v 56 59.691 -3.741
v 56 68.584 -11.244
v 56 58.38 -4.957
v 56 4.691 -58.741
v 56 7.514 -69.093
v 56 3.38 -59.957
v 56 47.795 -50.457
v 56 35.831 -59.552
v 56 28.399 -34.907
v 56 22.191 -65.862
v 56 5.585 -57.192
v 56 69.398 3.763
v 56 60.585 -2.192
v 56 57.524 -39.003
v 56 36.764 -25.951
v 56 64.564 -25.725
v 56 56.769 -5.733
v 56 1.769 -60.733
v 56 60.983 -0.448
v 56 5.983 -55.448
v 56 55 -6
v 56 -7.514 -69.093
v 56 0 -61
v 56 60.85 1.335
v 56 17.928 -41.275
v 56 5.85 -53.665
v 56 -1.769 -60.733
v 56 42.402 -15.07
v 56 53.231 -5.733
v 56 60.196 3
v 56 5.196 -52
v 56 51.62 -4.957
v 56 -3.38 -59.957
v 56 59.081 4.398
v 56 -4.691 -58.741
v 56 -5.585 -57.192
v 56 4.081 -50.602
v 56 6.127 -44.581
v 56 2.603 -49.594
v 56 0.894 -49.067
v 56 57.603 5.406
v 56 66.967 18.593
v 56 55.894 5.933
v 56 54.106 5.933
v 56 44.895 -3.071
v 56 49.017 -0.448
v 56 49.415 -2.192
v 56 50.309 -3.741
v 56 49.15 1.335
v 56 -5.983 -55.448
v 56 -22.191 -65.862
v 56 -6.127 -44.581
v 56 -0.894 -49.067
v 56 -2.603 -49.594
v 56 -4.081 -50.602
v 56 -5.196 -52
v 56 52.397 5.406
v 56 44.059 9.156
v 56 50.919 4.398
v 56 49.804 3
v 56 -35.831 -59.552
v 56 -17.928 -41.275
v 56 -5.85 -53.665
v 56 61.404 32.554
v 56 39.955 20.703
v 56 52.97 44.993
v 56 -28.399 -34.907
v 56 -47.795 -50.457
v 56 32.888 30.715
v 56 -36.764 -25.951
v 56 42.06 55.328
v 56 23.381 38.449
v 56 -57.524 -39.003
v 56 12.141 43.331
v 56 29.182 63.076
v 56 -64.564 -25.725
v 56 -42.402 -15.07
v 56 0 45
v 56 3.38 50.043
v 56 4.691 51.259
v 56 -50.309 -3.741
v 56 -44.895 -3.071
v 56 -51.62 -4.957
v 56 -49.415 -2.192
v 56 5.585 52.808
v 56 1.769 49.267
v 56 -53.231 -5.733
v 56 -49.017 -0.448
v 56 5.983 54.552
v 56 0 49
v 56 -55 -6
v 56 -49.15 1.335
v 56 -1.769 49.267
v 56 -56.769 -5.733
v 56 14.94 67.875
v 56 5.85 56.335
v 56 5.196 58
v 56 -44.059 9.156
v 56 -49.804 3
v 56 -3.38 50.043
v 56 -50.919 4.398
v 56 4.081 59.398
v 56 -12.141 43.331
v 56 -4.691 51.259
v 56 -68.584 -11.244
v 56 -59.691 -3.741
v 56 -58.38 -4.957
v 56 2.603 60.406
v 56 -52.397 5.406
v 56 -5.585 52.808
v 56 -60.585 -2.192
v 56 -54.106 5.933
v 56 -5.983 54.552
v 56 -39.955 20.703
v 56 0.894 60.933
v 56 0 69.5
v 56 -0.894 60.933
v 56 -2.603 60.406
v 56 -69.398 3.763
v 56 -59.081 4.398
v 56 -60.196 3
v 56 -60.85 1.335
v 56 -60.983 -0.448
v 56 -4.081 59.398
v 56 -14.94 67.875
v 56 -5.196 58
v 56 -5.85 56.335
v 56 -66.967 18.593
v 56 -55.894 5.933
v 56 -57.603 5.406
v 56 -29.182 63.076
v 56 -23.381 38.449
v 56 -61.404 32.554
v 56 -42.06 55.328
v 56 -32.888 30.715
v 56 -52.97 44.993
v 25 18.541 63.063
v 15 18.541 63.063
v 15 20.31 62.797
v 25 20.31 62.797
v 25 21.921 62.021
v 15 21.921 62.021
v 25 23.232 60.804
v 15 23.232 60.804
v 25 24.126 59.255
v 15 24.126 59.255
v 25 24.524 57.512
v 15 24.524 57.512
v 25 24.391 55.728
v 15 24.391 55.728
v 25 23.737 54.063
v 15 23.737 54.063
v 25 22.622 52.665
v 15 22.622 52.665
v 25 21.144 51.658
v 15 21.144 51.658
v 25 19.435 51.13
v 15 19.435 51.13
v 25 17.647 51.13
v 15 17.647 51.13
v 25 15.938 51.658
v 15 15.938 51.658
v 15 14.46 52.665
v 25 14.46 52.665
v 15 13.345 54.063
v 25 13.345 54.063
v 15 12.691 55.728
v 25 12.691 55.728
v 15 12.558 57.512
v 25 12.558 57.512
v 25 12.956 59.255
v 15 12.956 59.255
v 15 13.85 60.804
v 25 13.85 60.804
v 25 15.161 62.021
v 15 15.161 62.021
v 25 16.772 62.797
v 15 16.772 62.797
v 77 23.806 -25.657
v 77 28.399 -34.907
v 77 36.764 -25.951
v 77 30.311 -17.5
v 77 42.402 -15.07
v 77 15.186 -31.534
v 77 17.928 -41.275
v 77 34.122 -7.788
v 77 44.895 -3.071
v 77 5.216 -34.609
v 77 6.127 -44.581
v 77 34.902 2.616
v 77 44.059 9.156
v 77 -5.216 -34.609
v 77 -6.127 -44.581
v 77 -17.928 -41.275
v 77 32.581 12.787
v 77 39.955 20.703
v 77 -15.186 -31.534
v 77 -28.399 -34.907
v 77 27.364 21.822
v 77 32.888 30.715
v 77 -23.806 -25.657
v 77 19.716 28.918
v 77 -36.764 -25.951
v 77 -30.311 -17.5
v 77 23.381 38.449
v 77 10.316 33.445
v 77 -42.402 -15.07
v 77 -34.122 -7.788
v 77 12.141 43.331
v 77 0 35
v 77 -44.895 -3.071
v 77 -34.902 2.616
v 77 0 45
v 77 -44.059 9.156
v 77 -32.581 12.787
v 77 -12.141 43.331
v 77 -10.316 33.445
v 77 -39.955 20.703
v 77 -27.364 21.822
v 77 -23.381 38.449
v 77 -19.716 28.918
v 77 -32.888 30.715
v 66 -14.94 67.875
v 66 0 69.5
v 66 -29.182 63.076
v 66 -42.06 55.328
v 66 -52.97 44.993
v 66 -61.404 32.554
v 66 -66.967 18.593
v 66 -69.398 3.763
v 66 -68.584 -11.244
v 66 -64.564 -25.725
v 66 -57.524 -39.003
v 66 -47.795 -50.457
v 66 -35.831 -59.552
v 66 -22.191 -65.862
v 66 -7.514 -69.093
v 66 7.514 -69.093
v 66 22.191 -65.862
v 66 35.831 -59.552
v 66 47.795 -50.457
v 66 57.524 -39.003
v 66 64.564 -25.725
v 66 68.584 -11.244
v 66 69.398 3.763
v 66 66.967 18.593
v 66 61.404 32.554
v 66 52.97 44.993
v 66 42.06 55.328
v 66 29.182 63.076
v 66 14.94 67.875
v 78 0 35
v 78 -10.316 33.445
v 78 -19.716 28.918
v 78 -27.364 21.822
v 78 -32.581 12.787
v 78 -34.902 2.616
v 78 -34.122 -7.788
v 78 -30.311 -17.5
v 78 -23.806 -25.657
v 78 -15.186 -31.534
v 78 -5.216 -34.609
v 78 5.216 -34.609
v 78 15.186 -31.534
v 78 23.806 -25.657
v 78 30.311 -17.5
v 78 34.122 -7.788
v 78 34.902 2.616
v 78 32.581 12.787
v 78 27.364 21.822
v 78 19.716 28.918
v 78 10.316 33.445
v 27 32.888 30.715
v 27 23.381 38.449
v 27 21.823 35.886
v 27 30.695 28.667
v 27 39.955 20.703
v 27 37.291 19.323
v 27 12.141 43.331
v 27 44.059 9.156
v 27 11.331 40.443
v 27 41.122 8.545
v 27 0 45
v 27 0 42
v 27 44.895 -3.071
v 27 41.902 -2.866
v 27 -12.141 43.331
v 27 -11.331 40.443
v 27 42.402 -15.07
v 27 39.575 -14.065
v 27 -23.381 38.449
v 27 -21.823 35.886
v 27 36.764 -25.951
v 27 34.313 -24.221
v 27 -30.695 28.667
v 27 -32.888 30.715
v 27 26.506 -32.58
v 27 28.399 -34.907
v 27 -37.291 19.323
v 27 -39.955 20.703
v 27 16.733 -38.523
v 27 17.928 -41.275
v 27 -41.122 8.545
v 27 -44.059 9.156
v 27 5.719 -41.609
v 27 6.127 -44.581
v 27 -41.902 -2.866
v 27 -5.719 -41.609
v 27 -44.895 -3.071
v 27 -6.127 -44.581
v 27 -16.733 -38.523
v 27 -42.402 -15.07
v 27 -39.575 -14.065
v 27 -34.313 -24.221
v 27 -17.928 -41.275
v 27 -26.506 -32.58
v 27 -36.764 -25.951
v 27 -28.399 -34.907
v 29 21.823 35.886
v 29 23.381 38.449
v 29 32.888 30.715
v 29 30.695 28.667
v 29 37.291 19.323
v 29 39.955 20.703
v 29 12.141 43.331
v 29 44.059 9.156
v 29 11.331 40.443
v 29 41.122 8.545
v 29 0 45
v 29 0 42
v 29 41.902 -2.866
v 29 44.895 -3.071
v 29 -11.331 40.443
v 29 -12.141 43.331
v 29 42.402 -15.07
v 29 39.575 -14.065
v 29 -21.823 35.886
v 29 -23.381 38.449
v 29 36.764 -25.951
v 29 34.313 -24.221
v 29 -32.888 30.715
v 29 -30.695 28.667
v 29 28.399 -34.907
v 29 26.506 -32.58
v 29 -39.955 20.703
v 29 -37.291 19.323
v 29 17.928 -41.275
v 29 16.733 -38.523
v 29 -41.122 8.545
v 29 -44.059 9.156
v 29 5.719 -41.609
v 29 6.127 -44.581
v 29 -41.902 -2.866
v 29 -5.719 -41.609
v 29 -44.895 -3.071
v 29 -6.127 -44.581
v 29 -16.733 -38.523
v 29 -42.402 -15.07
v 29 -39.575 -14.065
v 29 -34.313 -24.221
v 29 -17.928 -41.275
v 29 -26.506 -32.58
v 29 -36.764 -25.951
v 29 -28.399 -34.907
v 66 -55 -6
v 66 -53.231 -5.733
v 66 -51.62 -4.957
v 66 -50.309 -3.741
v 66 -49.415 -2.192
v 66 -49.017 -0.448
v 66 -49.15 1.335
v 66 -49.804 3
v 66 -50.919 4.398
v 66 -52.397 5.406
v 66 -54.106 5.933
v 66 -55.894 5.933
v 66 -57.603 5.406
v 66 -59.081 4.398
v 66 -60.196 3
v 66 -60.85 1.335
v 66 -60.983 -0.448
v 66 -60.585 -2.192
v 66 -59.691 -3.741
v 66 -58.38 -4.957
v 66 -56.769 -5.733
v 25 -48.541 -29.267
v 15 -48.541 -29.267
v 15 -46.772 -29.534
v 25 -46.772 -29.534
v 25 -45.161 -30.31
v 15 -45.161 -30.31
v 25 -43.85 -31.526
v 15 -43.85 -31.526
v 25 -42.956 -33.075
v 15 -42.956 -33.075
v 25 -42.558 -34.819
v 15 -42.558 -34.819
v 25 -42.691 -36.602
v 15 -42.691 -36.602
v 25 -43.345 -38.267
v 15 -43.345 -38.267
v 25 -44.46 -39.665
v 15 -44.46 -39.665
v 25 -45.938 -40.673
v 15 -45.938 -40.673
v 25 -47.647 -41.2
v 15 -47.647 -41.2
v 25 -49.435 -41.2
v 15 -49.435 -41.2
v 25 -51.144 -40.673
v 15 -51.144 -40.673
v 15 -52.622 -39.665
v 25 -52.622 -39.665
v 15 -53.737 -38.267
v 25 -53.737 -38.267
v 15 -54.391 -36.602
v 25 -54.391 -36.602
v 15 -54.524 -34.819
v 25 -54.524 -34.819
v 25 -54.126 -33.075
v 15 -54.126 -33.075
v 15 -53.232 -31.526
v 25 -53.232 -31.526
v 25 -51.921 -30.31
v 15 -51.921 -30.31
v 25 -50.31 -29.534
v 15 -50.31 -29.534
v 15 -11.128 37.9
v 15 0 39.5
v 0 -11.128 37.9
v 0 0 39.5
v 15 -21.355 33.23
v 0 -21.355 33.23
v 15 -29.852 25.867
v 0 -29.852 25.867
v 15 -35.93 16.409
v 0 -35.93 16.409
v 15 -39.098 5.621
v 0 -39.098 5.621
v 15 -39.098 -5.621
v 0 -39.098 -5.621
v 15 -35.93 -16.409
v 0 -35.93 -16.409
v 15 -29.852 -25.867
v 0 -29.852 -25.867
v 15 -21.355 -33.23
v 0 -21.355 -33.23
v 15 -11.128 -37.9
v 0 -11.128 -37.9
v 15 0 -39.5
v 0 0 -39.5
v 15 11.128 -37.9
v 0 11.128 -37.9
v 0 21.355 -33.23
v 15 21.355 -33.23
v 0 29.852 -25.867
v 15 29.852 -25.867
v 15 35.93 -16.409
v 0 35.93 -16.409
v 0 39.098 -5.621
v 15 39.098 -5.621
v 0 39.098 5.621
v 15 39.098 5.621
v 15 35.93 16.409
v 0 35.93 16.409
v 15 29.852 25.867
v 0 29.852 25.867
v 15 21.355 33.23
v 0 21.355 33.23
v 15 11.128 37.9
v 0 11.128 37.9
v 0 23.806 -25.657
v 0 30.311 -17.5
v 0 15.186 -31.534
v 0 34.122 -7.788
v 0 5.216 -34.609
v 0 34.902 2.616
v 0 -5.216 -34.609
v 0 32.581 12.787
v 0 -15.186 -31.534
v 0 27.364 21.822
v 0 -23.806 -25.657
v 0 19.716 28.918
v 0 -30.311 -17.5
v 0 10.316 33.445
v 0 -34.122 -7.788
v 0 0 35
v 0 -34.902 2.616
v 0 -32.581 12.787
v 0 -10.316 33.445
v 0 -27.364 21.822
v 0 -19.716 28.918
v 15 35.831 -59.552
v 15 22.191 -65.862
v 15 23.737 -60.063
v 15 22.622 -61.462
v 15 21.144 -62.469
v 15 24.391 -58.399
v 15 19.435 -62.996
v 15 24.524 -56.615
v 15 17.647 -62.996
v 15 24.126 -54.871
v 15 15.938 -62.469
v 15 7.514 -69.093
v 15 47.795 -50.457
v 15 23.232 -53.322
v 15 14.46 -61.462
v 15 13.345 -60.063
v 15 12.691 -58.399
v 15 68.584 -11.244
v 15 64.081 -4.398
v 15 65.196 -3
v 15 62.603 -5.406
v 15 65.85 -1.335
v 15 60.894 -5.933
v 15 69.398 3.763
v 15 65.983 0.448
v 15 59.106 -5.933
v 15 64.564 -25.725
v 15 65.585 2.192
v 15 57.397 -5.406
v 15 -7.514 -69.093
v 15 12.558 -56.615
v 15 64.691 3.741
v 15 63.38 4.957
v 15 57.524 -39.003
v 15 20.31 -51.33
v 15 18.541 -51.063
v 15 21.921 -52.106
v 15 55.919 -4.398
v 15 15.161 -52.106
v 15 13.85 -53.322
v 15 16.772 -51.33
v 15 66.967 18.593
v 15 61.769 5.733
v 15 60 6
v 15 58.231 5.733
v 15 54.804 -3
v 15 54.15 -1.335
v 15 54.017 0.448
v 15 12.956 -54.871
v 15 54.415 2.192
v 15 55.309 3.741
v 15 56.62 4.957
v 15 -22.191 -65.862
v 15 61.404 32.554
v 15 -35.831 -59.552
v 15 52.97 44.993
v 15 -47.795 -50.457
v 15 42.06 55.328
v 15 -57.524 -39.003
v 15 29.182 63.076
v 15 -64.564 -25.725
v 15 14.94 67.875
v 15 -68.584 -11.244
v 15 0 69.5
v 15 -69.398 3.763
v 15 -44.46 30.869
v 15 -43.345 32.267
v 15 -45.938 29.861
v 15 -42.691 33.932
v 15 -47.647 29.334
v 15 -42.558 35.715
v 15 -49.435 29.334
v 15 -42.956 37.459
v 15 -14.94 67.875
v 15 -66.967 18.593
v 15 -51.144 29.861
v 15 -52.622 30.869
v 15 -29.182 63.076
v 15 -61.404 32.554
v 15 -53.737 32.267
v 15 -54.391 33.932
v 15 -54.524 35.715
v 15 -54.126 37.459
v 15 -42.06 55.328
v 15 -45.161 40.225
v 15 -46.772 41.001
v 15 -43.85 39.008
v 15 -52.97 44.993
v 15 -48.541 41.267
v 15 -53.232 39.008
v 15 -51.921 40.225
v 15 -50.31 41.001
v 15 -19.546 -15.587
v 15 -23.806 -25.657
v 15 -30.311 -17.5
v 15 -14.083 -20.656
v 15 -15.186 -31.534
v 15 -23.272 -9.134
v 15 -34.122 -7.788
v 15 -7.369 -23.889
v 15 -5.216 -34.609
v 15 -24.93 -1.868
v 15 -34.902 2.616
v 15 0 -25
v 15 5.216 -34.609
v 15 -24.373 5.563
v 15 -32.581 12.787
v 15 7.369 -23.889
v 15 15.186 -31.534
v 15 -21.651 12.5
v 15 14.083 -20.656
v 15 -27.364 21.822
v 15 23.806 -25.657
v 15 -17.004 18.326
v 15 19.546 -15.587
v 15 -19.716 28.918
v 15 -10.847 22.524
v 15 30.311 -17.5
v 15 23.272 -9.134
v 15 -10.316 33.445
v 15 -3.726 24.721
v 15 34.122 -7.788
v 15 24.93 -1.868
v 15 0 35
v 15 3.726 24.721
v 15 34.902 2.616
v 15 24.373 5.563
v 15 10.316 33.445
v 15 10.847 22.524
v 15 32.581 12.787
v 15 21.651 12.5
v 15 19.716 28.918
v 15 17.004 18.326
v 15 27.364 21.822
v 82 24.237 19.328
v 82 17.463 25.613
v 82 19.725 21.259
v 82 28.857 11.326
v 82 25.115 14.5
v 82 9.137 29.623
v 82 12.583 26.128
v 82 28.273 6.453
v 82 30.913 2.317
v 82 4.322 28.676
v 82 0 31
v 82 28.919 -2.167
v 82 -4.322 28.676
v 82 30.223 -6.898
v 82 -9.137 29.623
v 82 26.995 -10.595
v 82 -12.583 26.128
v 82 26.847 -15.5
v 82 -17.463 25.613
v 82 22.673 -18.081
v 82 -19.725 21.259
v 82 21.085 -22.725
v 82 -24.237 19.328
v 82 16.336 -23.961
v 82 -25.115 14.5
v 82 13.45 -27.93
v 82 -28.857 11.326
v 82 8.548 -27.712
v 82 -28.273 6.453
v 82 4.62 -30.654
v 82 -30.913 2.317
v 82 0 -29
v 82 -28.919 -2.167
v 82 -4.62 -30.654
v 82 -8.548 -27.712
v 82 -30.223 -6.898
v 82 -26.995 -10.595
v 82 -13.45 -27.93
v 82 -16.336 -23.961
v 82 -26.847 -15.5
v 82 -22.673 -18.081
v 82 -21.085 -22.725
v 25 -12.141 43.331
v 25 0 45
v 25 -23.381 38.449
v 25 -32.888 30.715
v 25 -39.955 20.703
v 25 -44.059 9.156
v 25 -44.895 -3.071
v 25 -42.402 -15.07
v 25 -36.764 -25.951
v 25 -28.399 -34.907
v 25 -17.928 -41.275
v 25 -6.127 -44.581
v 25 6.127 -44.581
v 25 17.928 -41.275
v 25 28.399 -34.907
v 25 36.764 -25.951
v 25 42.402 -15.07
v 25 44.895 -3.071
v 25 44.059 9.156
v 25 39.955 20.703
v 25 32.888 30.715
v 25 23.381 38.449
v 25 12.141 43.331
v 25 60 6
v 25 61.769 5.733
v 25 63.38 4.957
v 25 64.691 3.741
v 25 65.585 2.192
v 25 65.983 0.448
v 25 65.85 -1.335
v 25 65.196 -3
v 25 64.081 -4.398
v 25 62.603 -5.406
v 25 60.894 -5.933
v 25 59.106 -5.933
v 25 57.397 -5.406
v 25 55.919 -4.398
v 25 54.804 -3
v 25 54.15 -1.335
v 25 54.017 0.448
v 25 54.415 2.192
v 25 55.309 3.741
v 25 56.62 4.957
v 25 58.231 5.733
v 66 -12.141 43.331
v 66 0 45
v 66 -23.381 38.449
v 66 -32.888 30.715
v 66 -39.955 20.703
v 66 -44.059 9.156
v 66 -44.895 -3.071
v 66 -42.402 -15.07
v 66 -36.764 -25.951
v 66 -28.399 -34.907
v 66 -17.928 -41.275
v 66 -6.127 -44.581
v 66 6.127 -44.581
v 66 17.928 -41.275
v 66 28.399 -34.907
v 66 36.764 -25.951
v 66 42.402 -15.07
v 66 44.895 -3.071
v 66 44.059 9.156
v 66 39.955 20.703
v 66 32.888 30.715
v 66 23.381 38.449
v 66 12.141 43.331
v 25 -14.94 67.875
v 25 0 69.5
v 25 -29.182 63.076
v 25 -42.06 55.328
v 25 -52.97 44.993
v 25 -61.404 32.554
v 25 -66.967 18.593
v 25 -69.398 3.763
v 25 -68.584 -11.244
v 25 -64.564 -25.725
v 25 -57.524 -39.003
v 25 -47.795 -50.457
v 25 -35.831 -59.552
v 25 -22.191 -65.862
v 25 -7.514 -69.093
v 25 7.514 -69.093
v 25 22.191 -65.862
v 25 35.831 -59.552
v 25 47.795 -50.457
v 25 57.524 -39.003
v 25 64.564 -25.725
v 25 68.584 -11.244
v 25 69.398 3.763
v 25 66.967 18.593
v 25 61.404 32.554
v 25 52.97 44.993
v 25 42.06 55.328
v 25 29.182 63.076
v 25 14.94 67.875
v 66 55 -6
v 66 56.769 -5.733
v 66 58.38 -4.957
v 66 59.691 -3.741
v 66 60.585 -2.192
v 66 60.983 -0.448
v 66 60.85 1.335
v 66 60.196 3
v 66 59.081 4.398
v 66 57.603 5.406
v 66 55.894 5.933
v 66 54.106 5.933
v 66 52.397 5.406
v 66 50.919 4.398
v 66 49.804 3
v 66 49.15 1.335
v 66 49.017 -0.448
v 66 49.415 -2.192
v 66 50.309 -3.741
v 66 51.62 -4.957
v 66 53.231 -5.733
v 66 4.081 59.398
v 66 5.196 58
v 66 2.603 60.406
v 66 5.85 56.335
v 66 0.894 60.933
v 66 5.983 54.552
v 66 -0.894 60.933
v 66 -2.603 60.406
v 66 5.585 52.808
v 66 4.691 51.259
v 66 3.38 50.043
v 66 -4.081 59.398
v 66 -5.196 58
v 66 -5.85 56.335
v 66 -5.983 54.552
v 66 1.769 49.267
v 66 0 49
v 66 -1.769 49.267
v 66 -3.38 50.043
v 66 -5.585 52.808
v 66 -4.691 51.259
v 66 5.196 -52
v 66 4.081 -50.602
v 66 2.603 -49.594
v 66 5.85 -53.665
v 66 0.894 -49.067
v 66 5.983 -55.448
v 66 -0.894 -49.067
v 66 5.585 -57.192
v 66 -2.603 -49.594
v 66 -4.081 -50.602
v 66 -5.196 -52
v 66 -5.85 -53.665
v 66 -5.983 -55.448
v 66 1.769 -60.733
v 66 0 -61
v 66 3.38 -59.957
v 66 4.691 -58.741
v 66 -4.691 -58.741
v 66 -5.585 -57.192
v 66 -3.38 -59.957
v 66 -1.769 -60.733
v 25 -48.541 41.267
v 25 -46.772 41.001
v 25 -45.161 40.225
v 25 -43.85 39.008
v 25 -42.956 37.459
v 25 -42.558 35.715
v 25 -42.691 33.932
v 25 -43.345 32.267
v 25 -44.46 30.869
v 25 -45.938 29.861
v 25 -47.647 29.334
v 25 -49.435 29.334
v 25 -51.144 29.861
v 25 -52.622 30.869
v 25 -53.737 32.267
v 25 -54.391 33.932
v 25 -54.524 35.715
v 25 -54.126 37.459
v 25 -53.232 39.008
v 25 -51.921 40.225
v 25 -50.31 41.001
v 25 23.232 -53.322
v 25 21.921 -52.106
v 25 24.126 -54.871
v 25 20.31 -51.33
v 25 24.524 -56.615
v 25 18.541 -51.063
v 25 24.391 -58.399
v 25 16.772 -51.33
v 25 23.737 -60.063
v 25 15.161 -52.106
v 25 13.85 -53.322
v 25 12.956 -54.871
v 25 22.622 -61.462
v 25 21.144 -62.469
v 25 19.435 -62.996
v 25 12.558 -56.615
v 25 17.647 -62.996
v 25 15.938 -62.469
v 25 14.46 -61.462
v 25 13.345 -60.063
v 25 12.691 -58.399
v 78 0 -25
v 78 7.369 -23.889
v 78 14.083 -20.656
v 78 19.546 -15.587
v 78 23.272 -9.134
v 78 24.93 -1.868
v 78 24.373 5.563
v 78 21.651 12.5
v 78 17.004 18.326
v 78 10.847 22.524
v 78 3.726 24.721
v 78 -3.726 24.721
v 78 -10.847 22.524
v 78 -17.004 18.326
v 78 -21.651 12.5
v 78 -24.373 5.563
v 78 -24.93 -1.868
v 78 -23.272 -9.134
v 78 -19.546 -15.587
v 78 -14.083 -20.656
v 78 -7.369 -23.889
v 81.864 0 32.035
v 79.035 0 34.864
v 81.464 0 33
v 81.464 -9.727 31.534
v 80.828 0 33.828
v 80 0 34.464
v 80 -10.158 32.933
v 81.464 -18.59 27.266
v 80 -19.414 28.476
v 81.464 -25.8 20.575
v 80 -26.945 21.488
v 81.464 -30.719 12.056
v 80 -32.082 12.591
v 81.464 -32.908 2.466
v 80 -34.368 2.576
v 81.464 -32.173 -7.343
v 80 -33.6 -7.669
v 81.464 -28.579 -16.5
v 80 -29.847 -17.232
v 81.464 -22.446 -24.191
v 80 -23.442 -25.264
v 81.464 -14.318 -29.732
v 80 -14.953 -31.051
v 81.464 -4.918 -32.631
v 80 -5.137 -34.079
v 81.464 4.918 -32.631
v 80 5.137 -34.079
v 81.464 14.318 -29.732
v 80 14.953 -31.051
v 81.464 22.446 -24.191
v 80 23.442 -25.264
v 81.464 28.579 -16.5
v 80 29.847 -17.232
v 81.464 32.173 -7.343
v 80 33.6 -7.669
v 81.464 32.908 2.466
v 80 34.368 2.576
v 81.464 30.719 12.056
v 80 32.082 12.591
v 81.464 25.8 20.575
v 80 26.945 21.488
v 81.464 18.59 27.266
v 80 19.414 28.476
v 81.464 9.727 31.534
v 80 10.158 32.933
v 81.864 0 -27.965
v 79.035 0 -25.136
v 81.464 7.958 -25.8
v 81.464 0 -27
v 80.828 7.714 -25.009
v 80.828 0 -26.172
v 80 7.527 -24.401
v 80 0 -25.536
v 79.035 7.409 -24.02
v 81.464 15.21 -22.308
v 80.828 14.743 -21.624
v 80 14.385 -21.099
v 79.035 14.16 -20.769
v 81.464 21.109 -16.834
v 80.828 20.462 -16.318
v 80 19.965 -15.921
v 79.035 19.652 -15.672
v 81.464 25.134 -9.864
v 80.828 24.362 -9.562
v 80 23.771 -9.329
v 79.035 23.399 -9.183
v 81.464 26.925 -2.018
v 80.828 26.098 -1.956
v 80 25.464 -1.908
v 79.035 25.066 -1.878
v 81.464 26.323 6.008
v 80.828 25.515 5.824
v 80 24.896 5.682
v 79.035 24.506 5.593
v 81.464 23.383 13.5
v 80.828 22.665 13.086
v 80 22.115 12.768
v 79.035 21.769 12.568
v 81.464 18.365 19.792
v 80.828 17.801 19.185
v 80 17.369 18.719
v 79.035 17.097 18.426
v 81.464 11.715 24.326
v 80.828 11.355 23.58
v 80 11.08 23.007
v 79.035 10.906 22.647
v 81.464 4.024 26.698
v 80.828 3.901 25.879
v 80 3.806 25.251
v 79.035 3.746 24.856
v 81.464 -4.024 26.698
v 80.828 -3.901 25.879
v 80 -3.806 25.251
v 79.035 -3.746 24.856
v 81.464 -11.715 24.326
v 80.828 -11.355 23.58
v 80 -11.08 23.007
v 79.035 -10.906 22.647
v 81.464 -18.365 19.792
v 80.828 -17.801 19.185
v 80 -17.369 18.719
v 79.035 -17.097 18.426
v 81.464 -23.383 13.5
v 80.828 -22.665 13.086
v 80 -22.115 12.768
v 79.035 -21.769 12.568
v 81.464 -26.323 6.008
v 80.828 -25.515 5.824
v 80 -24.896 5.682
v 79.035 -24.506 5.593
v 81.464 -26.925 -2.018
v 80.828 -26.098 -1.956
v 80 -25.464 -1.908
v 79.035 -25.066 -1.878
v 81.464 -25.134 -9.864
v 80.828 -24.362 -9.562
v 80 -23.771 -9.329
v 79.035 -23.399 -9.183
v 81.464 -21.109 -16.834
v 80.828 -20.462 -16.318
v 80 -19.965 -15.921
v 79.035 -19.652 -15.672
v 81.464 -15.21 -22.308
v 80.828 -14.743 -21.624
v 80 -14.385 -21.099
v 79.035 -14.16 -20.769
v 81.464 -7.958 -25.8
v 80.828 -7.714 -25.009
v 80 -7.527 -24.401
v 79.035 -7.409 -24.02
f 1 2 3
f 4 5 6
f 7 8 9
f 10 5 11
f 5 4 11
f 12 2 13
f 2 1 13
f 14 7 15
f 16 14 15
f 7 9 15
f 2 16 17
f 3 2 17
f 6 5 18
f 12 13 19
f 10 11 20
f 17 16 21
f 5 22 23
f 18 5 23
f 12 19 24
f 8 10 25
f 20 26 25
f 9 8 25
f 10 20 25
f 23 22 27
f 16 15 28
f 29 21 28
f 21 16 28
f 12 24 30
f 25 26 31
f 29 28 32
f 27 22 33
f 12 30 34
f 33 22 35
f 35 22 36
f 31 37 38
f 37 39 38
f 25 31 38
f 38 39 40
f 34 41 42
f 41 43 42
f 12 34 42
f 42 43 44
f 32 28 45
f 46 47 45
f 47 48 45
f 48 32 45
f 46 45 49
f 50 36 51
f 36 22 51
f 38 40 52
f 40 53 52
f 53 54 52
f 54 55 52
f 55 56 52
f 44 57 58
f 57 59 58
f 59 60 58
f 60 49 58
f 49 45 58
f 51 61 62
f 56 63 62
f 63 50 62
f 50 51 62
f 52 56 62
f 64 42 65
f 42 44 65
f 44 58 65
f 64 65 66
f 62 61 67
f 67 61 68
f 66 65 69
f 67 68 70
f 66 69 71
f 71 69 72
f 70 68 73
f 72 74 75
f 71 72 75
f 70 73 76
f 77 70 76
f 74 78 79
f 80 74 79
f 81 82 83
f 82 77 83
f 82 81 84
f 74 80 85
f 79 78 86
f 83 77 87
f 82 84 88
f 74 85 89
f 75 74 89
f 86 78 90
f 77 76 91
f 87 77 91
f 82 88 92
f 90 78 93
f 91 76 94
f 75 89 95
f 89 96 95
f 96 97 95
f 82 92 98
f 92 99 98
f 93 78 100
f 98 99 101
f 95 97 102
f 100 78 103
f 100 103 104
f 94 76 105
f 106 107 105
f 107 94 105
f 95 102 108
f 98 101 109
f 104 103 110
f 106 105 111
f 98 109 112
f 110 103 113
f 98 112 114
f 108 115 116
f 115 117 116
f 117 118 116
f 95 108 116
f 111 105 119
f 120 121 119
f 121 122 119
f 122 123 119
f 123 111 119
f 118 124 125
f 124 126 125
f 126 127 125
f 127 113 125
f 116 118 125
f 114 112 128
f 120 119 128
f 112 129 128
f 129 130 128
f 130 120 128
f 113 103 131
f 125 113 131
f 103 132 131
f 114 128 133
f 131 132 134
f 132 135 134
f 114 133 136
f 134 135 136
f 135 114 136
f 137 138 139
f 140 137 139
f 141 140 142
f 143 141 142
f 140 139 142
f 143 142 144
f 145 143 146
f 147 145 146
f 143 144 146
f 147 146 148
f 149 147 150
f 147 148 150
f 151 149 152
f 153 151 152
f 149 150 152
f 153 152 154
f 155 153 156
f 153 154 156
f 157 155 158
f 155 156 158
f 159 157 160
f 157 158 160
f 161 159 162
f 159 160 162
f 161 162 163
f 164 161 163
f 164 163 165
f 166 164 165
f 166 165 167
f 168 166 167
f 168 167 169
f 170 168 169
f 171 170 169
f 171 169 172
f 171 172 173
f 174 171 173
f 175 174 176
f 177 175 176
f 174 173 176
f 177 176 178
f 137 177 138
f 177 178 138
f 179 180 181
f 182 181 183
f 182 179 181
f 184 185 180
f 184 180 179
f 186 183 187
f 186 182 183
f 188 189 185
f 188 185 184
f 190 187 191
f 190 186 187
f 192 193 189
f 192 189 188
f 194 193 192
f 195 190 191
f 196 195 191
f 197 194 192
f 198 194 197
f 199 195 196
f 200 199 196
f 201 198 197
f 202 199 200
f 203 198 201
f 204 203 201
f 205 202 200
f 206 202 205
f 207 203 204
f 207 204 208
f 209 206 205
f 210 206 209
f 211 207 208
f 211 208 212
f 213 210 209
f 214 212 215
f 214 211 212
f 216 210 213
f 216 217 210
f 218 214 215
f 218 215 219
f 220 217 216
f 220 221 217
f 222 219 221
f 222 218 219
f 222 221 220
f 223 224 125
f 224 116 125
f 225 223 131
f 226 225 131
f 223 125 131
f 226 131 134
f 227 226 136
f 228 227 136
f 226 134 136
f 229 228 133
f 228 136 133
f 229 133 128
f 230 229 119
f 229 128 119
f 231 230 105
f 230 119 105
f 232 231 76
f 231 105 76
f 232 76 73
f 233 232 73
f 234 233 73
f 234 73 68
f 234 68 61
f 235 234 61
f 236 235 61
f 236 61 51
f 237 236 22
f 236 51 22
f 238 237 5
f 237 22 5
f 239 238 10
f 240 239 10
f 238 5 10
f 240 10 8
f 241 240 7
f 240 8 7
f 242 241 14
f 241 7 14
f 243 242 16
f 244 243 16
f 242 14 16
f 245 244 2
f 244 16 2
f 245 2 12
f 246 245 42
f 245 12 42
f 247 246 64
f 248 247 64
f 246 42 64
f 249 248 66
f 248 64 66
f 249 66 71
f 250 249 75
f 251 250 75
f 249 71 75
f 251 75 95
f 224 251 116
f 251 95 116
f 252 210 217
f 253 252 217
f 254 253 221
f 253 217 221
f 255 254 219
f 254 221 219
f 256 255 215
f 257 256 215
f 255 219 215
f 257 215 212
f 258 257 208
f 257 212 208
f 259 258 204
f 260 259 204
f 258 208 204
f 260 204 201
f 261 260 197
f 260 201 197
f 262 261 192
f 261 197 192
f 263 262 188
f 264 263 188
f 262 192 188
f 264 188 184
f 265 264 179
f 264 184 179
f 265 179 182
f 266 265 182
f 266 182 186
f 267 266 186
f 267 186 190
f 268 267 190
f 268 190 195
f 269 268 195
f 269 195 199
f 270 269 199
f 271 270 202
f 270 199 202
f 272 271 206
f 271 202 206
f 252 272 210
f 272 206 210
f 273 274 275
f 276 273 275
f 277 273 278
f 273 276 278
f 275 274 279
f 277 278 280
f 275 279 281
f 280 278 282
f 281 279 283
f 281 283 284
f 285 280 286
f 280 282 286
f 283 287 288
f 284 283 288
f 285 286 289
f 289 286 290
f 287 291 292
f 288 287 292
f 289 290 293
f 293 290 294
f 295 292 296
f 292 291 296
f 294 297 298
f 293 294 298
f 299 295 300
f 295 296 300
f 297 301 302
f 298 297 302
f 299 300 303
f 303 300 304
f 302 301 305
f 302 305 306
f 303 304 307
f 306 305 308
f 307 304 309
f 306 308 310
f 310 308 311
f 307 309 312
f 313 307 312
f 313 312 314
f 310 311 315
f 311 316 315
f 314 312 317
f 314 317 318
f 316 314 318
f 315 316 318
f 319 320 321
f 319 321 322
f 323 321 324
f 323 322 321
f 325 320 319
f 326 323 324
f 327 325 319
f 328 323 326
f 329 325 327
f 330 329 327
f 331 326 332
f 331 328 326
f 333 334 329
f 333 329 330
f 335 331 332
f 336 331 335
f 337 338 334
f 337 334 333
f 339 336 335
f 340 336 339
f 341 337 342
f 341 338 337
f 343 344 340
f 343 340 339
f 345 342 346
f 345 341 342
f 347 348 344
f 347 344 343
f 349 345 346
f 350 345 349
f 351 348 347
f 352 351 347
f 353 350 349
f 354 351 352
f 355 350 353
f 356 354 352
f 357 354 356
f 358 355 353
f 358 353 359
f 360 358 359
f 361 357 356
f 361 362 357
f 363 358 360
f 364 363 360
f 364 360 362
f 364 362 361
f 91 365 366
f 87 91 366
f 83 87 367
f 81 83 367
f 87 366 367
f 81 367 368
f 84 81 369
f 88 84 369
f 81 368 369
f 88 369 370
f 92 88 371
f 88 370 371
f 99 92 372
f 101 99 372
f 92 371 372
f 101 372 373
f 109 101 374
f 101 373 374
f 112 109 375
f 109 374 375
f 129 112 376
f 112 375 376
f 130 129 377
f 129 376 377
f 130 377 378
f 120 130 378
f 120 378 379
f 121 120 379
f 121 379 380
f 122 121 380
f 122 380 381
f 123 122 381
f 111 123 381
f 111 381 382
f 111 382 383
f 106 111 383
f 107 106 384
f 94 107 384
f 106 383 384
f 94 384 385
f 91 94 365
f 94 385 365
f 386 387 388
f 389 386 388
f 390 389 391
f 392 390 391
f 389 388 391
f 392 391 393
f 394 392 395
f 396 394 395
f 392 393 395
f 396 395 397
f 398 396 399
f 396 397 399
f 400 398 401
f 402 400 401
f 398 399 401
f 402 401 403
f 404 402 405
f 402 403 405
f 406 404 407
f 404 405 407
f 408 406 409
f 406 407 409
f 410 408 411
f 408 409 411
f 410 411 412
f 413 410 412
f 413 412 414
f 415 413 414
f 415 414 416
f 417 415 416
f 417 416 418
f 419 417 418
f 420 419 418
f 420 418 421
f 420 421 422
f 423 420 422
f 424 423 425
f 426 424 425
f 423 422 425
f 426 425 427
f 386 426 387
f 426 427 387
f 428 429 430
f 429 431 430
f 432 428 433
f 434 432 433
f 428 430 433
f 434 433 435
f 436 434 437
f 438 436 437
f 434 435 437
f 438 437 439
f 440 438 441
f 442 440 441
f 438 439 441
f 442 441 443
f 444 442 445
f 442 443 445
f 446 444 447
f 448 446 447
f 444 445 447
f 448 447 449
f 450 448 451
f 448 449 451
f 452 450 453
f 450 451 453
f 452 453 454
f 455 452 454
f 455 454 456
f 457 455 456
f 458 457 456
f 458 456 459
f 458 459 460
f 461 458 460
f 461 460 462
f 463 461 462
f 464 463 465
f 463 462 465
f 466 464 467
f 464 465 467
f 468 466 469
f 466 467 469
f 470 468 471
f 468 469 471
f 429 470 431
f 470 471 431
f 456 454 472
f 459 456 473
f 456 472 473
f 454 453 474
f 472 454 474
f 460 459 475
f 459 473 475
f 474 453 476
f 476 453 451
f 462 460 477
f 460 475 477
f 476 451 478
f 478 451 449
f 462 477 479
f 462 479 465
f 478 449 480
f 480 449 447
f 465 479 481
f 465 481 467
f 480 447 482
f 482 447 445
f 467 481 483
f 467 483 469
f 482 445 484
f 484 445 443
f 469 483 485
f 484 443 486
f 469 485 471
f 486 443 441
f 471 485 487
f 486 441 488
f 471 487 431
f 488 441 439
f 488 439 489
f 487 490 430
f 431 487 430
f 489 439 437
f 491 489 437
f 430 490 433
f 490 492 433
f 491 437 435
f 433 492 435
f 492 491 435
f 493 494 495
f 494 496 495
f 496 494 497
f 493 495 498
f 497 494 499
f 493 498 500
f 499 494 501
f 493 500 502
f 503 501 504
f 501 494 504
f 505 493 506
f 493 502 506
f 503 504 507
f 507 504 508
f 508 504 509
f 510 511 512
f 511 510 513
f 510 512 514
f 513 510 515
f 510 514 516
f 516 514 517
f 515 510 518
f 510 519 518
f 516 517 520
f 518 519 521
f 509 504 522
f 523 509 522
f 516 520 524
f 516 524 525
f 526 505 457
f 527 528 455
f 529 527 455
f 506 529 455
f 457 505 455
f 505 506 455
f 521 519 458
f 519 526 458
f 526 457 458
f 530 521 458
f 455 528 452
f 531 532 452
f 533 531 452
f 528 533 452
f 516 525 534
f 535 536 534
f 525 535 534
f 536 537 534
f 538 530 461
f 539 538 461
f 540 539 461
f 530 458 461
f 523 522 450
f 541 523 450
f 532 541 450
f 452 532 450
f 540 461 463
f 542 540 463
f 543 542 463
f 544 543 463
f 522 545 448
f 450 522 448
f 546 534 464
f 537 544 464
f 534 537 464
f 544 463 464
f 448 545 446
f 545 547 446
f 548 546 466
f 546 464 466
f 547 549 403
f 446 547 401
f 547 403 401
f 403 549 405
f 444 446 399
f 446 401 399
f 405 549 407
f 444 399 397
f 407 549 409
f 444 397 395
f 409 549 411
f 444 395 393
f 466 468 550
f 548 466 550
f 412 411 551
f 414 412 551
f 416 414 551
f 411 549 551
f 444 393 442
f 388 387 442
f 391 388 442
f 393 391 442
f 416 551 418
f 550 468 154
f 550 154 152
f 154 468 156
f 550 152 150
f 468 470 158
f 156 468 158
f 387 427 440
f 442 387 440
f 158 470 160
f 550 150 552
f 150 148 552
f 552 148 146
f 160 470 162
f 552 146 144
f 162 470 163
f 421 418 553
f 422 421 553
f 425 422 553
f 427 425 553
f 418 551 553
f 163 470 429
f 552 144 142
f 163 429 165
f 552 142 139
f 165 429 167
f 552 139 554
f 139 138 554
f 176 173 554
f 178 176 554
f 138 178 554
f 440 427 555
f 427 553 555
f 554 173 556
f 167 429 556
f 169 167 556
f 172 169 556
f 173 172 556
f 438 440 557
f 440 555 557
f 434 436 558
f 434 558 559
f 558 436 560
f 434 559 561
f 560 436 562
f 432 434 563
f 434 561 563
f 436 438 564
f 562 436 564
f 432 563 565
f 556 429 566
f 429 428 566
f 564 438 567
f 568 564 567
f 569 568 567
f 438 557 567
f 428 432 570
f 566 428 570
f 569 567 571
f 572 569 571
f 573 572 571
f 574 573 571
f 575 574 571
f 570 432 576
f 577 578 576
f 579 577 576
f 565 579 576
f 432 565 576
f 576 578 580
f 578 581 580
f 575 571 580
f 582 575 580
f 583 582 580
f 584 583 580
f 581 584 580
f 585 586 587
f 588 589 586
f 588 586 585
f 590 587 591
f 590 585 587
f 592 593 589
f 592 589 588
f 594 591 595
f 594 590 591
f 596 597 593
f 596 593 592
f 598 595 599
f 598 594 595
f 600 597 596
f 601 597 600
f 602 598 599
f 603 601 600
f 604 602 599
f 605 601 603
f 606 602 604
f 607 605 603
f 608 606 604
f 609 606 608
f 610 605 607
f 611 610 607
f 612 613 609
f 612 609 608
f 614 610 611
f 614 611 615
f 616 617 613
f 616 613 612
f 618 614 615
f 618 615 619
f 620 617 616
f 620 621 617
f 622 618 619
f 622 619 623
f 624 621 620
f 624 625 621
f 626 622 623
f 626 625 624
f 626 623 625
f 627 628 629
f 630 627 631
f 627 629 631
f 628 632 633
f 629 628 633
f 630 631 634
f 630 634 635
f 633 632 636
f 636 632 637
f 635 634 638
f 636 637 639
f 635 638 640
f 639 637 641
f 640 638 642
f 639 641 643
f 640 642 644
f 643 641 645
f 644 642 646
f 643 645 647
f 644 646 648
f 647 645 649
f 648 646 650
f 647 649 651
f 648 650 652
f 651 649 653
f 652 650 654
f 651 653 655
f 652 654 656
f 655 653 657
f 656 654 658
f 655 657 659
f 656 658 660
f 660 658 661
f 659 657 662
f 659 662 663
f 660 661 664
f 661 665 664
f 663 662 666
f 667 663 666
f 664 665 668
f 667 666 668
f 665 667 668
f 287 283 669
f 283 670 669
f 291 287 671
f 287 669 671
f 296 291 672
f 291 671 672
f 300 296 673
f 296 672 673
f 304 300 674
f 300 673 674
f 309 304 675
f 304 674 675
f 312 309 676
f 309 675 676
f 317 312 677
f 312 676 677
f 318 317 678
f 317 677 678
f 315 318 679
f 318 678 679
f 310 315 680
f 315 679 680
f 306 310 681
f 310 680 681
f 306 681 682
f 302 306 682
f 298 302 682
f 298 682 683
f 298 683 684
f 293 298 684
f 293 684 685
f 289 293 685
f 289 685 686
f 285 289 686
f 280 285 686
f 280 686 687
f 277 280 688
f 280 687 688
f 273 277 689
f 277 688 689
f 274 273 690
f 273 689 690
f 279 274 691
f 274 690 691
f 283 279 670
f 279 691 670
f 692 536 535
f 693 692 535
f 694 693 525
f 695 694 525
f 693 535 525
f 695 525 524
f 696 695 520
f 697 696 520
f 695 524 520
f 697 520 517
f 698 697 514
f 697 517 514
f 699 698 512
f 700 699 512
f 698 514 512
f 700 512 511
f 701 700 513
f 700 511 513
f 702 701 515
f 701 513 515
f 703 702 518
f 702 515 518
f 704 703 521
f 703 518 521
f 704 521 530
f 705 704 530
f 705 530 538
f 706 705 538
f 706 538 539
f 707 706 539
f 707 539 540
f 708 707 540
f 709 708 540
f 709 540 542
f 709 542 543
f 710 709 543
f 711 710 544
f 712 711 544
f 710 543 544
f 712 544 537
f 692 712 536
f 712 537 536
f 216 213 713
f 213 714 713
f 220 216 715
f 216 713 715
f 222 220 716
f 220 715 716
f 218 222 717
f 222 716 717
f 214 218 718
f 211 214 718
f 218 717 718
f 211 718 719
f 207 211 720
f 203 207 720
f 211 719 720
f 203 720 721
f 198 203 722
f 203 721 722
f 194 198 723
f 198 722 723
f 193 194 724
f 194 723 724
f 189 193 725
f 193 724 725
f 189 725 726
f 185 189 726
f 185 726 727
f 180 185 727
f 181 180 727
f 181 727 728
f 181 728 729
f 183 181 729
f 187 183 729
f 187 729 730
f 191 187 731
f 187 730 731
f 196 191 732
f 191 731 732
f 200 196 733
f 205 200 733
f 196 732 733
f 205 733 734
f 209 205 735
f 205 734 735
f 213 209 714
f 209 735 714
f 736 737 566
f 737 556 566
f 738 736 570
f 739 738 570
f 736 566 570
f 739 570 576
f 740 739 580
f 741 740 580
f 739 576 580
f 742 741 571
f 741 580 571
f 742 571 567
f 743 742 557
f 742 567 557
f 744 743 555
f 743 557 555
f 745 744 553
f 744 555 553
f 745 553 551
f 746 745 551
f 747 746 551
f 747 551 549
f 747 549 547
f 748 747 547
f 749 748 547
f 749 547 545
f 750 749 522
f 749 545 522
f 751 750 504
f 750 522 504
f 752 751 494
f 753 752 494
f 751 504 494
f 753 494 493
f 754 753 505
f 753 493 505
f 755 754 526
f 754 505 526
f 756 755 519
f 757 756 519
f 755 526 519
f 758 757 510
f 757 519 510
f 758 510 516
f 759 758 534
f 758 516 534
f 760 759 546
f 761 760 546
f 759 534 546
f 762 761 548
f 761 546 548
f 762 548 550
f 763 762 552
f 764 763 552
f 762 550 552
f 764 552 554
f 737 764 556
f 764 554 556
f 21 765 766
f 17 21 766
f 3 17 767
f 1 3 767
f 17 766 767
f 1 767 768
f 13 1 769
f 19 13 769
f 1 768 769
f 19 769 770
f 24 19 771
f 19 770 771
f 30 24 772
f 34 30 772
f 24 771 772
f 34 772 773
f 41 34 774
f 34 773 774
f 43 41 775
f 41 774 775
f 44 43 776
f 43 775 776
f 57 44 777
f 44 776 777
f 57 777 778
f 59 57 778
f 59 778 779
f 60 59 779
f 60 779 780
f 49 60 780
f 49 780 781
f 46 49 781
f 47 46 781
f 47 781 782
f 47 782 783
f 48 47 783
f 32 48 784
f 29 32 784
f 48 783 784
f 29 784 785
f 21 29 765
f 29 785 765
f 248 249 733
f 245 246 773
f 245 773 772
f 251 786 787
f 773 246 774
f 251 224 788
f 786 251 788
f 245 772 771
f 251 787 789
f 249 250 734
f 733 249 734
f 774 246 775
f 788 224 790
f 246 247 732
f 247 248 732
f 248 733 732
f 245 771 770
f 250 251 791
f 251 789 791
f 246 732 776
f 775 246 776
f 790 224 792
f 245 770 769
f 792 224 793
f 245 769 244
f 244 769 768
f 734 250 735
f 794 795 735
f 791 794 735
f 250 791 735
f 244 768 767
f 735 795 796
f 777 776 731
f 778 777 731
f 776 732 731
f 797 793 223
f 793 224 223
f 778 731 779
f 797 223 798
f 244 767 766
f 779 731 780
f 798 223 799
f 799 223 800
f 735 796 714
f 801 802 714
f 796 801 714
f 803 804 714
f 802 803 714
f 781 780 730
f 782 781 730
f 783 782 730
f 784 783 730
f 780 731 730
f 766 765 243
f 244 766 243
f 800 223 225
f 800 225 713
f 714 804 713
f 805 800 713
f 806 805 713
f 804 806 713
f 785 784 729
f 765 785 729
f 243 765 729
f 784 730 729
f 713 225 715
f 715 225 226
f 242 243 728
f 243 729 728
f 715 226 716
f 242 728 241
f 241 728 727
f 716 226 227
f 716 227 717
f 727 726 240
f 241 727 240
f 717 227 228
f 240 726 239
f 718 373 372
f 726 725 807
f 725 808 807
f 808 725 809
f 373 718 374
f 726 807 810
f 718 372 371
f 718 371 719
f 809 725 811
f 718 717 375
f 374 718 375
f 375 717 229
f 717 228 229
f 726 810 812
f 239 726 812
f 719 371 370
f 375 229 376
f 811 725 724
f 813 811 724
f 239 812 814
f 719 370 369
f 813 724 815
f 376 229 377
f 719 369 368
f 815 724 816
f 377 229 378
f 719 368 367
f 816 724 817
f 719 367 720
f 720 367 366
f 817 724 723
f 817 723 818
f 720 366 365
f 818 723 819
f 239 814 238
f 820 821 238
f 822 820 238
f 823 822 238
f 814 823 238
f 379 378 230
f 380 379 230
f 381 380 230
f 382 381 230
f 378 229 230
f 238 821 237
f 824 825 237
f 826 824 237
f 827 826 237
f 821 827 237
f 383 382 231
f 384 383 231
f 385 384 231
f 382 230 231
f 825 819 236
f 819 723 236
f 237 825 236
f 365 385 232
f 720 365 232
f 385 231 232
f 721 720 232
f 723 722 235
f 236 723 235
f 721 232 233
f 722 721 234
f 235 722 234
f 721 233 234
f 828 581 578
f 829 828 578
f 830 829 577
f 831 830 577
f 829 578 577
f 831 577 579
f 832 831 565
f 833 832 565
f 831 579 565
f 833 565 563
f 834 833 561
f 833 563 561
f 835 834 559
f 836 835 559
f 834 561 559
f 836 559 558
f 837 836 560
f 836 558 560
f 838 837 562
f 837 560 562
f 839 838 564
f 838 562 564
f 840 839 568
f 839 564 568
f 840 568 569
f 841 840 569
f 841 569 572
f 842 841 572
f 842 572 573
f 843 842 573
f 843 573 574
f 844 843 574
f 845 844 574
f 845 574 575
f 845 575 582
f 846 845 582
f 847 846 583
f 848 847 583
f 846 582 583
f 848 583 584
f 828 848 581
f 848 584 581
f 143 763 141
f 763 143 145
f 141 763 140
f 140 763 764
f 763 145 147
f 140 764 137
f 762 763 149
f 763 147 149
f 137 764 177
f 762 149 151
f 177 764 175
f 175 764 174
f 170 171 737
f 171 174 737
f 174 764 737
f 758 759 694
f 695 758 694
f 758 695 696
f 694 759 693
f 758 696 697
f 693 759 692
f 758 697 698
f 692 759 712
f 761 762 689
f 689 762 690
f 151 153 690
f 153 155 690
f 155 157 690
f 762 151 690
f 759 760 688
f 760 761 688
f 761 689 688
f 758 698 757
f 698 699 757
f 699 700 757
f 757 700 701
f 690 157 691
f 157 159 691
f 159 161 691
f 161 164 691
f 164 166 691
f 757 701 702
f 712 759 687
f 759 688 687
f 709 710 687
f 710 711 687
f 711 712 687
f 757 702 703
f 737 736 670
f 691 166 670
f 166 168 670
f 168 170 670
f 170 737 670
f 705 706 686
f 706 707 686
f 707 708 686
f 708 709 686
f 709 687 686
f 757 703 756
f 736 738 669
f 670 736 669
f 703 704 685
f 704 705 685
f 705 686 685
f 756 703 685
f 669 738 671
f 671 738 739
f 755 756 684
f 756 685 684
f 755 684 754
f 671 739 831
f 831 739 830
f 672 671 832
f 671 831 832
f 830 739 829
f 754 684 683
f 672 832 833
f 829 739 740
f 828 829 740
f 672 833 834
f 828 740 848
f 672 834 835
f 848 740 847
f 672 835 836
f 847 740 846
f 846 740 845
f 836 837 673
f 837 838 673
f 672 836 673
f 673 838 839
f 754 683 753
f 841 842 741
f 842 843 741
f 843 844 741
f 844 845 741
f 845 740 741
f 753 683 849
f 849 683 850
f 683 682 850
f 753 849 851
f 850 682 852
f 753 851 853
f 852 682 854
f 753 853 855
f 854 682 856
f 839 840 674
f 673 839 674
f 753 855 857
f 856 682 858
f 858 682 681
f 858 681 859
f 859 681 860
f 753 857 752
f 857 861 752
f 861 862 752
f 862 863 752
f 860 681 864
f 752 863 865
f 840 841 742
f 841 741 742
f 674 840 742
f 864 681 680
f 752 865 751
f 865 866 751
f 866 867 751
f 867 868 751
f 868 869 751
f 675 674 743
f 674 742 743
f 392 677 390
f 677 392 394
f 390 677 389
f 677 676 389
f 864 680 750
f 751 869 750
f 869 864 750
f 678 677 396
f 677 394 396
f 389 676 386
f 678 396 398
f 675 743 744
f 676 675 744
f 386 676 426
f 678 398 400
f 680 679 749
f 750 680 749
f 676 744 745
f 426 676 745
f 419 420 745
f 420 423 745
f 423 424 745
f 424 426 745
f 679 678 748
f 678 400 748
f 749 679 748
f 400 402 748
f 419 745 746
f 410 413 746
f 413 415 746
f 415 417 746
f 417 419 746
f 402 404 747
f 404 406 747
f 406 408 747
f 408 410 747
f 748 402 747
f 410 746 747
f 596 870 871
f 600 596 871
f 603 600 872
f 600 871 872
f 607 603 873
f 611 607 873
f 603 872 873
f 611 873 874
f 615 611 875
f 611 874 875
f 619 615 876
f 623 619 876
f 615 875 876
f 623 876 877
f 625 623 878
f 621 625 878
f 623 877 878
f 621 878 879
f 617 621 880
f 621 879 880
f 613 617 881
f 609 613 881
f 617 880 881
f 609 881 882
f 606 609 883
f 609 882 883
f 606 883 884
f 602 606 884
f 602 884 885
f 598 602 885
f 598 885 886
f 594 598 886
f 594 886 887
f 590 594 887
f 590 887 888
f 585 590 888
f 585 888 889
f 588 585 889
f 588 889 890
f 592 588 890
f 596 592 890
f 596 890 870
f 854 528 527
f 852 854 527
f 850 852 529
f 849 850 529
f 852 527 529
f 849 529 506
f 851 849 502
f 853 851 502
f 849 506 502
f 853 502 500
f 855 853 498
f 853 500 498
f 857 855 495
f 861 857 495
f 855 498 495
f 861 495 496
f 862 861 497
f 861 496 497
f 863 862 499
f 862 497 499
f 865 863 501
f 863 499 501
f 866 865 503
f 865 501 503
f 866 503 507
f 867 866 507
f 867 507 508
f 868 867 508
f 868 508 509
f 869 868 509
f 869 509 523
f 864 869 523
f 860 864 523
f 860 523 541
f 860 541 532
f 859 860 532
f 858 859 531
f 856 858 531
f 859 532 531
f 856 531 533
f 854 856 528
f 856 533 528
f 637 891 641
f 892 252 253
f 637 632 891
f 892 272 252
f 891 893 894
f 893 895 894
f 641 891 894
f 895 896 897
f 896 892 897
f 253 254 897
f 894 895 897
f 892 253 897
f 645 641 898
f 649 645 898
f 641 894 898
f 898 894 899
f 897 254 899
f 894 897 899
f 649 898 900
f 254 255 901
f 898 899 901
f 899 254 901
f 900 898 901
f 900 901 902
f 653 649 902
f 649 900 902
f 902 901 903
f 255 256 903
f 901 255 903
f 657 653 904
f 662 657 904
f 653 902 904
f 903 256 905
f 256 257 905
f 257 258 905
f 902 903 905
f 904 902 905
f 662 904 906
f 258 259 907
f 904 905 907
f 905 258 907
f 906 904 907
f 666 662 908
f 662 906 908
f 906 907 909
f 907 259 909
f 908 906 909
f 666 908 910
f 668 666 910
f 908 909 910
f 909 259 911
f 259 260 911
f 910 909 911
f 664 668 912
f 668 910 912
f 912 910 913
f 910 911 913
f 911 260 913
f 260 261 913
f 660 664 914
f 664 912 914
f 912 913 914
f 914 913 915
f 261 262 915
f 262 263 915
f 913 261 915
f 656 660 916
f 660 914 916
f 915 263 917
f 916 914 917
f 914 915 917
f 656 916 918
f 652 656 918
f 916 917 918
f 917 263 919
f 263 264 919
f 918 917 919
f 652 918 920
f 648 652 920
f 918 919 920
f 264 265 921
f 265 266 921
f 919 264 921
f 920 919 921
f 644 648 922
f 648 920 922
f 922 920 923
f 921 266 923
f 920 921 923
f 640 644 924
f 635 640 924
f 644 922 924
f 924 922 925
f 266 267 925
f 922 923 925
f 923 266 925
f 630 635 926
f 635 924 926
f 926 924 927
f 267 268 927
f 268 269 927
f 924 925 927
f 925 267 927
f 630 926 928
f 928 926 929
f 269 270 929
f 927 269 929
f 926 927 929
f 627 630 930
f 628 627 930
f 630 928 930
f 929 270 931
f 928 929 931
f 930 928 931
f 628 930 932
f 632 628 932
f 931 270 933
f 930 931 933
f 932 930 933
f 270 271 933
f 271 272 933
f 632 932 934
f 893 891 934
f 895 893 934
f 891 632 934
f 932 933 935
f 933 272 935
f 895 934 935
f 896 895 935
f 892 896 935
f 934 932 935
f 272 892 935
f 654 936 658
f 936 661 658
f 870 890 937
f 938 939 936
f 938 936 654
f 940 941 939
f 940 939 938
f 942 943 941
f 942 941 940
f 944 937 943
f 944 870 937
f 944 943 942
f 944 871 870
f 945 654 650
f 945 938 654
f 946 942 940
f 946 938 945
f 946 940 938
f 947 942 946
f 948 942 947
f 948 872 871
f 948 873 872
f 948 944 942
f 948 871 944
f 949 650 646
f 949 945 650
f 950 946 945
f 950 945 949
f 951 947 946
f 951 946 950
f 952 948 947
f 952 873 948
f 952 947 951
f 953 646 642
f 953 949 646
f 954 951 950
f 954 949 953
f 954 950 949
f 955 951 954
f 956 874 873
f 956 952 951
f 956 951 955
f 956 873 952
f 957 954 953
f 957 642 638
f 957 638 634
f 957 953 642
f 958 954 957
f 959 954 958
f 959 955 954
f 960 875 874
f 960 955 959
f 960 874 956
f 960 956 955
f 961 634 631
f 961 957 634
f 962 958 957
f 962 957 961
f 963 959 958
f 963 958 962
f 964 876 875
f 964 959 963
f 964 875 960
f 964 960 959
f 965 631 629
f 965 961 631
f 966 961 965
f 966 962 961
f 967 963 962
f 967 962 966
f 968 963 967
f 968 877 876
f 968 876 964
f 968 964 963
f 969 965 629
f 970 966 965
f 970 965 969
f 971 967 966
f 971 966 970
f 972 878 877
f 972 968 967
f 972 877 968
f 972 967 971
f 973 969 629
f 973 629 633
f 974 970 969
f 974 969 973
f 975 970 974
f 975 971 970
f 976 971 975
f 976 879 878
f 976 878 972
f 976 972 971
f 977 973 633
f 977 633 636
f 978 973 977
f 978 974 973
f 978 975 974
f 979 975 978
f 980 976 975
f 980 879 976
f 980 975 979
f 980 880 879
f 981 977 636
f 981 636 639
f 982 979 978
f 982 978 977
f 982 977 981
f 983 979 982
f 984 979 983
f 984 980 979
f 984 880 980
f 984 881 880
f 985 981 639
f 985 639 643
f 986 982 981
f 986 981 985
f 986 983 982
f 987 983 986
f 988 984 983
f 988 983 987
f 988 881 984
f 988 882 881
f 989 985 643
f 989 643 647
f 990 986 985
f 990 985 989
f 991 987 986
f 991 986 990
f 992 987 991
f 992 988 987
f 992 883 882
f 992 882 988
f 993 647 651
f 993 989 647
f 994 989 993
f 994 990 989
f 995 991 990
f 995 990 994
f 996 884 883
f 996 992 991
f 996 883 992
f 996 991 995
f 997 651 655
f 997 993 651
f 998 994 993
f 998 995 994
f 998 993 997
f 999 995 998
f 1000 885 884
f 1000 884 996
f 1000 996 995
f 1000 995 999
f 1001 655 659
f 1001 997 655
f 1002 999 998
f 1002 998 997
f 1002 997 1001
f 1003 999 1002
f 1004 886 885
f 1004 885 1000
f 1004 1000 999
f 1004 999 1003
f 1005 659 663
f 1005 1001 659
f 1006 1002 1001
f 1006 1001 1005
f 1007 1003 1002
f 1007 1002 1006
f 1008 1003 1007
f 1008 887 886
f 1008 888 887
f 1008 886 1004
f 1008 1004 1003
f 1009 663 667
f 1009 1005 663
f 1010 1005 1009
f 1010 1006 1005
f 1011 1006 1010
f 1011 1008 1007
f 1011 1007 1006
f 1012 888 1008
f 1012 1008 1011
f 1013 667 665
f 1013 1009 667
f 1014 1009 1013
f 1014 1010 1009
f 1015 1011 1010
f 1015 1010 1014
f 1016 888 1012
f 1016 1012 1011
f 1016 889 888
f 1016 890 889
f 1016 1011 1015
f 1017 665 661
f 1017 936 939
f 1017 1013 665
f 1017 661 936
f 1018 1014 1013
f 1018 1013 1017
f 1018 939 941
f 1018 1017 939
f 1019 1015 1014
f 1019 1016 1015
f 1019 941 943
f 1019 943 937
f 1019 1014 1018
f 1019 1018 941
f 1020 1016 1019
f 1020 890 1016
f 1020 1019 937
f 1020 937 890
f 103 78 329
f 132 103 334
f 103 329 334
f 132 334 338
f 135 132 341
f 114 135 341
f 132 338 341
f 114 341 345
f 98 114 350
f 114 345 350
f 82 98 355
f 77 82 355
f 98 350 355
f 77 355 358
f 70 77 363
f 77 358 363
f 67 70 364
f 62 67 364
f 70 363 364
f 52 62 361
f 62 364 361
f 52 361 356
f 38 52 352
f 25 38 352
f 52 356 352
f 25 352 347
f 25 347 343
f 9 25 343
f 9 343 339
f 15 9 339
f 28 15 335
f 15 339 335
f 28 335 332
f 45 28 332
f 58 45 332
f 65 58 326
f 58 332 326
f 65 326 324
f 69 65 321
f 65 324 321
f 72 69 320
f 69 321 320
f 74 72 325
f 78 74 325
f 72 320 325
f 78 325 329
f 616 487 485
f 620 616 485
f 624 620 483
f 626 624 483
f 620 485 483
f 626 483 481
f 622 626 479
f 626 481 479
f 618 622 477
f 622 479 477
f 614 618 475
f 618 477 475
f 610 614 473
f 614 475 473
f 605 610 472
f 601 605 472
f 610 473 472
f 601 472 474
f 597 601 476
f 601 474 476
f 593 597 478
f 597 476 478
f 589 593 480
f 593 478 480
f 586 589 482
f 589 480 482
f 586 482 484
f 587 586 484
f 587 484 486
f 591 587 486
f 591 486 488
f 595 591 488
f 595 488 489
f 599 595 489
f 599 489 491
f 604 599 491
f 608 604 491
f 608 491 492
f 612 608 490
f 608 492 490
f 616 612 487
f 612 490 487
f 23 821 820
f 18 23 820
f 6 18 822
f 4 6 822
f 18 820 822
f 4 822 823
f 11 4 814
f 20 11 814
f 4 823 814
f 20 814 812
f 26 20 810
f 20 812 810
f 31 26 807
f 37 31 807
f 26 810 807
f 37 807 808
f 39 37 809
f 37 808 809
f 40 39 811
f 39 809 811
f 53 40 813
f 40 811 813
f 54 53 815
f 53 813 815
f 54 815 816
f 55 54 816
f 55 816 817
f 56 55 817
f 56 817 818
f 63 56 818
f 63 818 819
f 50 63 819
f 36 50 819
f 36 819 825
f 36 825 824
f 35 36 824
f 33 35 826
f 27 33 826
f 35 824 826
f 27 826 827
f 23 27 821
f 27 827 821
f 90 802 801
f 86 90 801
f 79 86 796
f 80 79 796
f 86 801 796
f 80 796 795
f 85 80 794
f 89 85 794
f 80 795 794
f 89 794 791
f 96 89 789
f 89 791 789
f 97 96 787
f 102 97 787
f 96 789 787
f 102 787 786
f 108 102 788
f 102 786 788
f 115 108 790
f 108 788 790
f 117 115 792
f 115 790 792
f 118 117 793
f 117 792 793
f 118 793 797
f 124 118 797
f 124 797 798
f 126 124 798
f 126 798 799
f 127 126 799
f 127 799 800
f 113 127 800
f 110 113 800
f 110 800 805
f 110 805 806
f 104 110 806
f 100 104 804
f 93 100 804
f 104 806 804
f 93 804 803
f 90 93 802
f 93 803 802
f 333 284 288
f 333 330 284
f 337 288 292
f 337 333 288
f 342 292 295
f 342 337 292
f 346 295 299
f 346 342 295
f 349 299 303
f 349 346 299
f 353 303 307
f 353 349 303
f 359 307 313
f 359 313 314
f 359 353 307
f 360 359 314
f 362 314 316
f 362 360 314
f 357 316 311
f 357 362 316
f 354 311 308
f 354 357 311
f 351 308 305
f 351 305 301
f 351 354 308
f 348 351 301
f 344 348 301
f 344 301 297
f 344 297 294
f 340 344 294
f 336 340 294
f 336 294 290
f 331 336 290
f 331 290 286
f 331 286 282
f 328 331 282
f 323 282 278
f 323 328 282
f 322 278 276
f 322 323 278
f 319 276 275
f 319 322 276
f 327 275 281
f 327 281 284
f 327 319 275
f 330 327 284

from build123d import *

# Parameters (mm, degrees)
SZKIC4_R                   = 6
WYTNIJ_WYCI_GNI_CIE1_DEPTH = 10
SZKIC5_R                   = 6
WYTNIJ_WYCI_GNI_CIE2_DEPTH = 10
SZKIC6_R                   = 35
WYTNIJ_WYCI_GNI_CIE3_DEPTH = 15
WYTNIJ_WYCI_GNI_CIE4_START = -5
SZKIC7_R                   = 45
SZKIC7_R_2                 = 35
WYTNIJ_WYCI_GNI_CIE4_DEPTH = 5
SZKIC8_R                   = 25
WYTNIJ_WYCI_GNI_CIE5_DEPTH = 70
ZAOKR_GLENIE1_R            = 4
SZKIC9_W                   = 2
SZKIC9_H                   = 3


with BuildPart() as part:
    # Szkic2 → Obrót1 (revolve)
    with BuildSketch(Plane.XY, mode=Mode.PRIVATE) as obr_t1_sk:
        Polygon((82, 0), (82, 45), (66, 45), (66, 69.5), (56, 69.5), (56, 45), (25, 45), (25, 69.5), (15, 69.5), (15, 39.5), (0, 39.5), (0, 0), align=None)
    revolve(obr_t1_sk.sketch.rotate(Axis((0, 0, 0), (1, 0, 0)), 90), axis=Axis((0, 0, 0), (1, 0, 0)))

    # Szkic4 → Wytnij-wyciągnięcie1 (cut)
    with BuildSketch(Plane(origin=(66, 0, 0), x_dir=(0, 0, -1), z_dir=(1, 0, 0))):
        with Locations((0, 55)):
            Circle(SZKIC4_R)
        with Locations((55, 0)):
            Circle(SZKIC4_R)
        with Locations((0, -55)):
            Circle(SZKIC4_R)
        with Locations((-55, 0)):
            Circle(SZKIC4_R)
    extrude(amount=-WYTNIJ_WYCI_GNI_CIE1_DEPTH, mode=Mode.SUBTRACT)

    # Szkic5 → Wytnij-wyciągnięcie2 (cut)
    with BuildSketch(Plane.ZY.offset(-15)):
        with Locations((0, 60)):
            Circle(SZKIC5_R)
        with Locations((57.063390978, 18.541019662)):
            Circle(SZKIC5_R)
        with Locations((35.267115138, -48.541019662)):
            Circle(SZKIC5_R)
        with Locations((-35.267115138, -48.541019662)):
            Circle(SZKIC5_R)
        with Locations((-57.063390978, 18.541019662)):
            Circle(SZKIC5_R)
    extrude(amount=-WYTNIJ_WYCI_GNI_CIE2_DEPTH, mode=Mode.SUBTRACT)

    # Szkic6 → Wytnij-wyciągnięcie3 (cut)
    with BuildSketch(Plane.ZY):
        Circle(SZKIC6_R)
    extrude(amount=-WYTNIJ_WYCI_GNI_CIE3_DEPTH, mode=Mode.SUBTRACT)

    # Szkic7 → Wytnij-wyciągnięcie4 (cut)
    with BuildSketch(Plane(origin=(82, 0, 0), x_dir=(0, 0, -1), z_dir=(1, 0, 0)).offset(WYTNIJ_WYCI_GNI_CIE4_START)):
        with Locations(Location((0, 0, 0), (0, 0, 180))):
            Circle(SZKIC7_R)
        with Locations(Location((0, 0, 0), (0, 0, 180))):
            Circle(SZKIC7_R_2, mode=Mode.SUBTRACT)
    extrude(amount=WYTNIJ_WYCI_GNI_CIE4_DEPTH, mode=Mode.SUBTRACT)

    # Szkic8 → Wytnij-wyciągnięcie5 (cut)
    with BuildSketch(Plane(origin=(82, 0, 0), x_dir=(0, 0, -1), z_dir=(1, 0, 0))):
        Circle(SZKIC8_R)
    extrude(amount=-WYTNIJ_WYCI_GNI_CIE5_DEPTH, mode=Mode.SUBTRACT)

    # Zaokrąglenie1
    zaokr_glenie1_edges = [part.edges().sort_by_distance(p)[0] for p in [
        (82, 0, -35),
        (82, 0, 25),
    ]]
    fillet(zaokr_glenie1_edges, radius=ZAOKR_GLENIE1_R)

    # Szkic9 → Wycięcie-obrót1 (revolve, cut)
    with BuildSketch(Plane.XY, mode=Mode.PRIVATE) as wyci_cie_obr_t1_sk:
        with Locations((28, 43.5)):
            Rectangle(SZKIC9_W, SZKIC9_H)
    revolve(wyci_cie_obr_t1_sk.sketch.rotate(Axis((-4.1, 0, 0), (1, 0, 0)), 90), axis=Axis((-4.1, 0, 0), (1, 0, 0)), mode=Mode.SUBTRACT)


solid = part.part
